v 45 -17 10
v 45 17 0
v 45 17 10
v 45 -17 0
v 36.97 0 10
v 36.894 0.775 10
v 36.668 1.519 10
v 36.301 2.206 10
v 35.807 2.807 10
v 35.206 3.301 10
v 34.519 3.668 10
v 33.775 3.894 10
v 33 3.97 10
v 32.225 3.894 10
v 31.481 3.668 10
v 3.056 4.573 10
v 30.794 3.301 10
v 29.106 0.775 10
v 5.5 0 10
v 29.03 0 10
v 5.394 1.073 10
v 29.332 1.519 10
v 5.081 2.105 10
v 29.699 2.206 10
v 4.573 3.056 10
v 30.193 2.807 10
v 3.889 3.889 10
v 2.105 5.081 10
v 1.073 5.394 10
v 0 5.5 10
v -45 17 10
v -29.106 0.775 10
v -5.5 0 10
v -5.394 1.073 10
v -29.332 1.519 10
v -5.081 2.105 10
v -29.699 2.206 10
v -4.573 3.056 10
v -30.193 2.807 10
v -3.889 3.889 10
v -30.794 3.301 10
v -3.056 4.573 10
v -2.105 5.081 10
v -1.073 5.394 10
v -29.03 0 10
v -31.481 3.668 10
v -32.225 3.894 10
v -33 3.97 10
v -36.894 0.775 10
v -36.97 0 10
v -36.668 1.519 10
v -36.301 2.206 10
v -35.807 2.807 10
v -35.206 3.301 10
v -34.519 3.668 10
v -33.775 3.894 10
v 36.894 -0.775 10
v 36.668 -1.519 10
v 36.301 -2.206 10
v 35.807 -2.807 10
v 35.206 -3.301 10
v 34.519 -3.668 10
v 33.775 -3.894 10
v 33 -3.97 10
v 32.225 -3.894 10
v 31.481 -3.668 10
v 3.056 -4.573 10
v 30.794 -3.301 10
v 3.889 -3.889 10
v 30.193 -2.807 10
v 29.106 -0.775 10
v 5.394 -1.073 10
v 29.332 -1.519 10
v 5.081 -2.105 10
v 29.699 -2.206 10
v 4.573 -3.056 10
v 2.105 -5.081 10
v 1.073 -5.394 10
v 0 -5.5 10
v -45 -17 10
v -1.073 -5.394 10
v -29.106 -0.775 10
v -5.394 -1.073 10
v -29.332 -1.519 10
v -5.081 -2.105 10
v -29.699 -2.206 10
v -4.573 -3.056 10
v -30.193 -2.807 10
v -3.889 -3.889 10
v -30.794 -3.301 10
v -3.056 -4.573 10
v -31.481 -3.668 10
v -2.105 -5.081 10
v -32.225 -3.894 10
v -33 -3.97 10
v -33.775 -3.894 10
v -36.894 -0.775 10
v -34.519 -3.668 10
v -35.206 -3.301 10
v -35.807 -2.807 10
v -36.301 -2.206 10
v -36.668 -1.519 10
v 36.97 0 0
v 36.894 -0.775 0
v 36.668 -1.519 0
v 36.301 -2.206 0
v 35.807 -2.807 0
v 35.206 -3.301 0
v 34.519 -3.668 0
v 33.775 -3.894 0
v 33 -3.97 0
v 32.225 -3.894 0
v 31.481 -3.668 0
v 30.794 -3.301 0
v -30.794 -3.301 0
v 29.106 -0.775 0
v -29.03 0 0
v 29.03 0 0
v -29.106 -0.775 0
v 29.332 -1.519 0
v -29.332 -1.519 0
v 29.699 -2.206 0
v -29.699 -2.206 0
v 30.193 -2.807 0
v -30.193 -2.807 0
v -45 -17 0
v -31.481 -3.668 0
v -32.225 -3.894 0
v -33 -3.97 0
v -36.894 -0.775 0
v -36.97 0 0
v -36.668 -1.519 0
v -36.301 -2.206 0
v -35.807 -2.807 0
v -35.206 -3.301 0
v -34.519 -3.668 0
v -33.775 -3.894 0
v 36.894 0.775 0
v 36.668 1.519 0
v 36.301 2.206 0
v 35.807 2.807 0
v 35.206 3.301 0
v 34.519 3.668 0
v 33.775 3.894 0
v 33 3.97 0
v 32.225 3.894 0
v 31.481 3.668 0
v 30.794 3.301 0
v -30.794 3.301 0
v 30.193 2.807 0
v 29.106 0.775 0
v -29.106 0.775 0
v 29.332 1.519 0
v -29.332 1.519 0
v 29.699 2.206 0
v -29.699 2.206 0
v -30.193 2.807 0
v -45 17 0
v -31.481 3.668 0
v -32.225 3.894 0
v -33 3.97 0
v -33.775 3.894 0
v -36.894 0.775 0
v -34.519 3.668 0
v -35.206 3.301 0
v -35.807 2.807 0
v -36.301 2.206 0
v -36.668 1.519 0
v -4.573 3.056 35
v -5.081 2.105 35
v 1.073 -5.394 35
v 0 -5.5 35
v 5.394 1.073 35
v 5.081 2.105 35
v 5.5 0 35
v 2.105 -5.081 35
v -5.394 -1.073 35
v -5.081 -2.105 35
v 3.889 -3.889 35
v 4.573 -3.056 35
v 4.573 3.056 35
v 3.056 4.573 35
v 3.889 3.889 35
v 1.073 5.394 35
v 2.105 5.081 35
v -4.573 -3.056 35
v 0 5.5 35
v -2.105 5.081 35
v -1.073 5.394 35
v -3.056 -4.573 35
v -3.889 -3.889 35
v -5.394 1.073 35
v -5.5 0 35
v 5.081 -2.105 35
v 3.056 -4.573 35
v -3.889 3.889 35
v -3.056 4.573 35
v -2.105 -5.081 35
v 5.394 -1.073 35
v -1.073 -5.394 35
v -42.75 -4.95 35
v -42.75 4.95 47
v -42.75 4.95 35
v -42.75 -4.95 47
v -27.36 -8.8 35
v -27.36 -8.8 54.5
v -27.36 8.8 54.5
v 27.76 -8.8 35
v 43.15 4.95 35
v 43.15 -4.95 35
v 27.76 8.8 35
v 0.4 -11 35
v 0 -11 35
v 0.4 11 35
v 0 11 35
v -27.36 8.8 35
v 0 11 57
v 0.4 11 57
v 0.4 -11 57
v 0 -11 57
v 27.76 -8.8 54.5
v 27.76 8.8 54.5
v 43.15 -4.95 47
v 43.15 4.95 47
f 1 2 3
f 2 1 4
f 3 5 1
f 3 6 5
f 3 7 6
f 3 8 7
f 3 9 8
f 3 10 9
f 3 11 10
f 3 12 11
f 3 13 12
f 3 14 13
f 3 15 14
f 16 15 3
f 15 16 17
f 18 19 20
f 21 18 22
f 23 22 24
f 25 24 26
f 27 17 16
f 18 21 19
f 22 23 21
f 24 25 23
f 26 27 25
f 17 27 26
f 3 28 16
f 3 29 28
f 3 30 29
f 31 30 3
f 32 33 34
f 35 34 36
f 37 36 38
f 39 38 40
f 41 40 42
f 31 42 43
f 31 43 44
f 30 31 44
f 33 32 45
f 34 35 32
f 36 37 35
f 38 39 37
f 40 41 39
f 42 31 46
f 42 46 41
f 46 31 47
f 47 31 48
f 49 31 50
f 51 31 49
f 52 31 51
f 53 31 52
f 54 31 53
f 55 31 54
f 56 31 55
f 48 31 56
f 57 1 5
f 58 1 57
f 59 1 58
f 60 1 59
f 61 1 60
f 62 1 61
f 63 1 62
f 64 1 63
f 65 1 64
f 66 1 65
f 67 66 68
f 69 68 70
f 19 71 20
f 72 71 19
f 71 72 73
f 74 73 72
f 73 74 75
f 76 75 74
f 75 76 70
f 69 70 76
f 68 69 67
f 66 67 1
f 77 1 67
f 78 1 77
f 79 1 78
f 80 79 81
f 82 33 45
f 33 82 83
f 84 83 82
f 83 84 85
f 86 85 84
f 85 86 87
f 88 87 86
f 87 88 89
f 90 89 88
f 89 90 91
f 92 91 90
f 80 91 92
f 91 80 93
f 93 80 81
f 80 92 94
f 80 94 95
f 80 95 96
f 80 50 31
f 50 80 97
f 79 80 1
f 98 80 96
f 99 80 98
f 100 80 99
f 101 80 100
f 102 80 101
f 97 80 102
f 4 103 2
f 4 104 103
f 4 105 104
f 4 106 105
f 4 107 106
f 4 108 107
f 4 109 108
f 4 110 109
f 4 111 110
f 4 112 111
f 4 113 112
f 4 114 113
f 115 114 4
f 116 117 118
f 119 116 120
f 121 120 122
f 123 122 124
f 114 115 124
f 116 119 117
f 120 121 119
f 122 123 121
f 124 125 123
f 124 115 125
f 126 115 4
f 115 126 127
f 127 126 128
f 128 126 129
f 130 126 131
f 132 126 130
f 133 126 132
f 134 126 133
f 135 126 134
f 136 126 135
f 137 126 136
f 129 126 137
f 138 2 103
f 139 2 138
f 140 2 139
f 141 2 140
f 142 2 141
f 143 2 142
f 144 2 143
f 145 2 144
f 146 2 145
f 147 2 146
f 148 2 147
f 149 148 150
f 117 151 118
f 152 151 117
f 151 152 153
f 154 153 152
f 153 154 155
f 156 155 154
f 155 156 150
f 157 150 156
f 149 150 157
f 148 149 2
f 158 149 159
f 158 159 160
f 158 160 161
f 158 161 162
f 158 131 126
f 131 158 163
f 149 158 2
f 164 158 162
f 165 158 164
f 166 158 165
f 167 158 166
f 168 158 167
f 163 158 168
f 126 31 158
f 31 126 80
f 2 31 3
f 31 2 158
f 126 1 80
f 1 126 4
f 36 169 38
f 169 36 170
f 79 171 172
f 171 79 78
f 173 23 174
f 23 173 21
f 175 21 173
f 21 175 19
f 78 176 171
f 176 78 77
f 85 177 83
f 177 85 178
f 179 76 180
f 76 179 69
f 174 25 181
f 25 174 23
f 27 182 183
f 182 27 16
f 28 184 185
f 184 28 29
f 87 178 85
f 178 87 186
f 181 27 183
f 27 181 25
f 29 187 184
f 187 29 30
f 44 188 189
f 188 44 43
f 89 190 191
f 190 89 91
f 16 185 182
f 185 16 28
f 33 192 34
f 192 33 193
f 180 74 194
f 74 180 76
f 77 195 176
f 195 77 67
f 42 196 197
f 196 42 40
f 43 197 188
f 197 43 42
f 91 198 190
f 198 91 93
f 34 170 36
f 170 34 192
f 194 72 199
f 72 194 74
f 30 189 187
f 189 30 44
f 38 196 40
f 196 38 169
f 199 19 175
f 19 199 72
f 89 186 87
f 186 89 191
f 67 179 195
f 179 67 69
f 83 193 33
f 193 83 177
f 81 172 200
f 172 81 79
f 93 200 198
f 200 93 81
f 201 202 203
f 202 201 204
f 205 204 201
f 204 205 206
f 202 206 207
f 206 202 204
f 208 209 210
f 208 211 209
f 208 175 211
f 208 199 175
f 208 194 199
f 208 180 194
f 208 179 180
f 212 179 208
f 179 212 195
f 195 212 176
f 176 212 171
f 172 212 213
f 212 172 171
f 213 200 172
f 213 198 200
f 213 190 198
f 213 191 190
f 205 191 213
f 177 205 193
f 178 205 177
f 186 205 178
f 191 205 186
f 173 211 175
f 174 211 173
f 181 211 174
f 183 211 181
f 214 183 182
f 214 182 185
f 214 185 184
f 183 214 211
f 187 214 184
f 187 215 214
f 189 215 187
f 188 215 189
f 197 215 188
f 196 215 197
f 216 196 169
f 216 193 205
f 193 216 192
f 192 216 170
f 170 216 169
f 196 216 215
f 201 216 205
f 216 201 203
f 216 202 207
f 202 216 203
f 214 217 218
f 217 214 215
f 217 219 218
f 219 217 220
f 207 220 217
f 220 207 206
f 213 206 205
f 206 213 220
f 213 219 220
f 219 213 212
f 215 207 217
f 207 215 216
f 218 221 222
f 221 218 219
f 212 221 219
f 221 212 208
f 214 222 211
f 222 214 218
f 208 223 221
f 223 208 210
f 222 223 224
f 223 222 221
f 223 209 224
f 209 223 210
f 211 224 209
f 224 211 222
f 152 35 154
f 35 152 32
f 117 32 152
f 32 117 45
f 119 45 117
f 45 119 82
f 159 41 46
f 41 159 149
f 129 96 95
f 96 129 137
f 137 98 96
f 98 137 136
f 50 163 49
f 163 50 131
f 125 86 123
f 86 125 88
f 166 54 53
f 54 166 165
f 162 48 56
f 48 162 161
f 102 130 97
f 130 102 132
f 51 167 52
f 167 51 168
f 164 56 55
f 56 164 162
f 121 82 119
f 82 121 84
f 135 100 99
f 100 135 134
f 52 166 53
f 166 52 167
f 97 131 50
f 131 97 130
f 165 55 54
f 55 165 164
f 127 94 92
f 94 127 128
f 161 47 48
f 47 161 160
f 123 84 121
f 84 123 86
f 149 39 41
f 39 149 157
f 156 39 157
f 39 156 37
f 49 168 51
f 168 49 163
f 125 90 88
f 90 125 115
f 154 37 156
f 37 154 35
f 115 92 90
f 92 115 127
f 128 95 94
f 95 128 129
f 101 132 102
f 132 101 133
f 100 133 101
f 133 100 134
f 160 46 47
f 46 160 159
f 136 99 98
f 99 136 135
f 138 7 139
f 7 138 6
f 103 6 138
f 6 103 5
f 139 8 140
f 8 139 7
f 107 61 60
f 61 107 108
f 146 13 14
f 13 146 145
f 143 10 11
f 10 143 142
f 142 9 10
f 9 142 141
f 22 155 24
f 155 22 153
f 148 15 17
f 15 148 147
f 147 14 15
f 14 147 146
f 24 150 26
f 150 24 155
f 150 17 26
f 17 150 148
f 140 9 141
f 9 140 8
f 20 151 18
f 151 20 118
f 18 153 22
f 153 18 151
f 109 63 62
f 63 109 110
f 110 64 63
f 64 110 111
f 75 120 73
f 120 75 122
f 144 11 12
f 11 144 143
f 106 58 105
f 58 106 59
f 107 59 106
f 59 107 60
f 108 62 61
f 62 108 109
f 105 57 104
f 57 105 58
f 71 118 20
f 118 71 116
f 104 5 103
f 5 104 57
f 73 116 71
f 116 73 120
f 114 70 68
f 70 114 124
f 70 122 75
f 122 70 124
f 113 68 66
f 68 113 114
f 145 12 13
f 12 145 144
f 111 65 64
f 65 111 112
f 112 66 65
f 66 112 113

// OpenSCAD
$fn = 32;

// ----------------------------------------------------------------------
// Boat cleat: 90 mm base, horn 46 mm up
// ----------------------------------------------------------------------

// --- parameters (mm) ---
base_l = 90;              // base length
base_w = 34;              // base width
base_t = 10;              // base thickness
horn_len = 85.5;          // horn length
horn_d = 22;              // horn diameter at the middle
horn_z = 46;              // horn axis height
end_drop = 10;            // how far the horn tips drop
post_d = 11;              // centre post diameter
holes_d = 7.94;           // fixing holes
hole_x = 33;              // fixing hole spacing

difference() {
  union() {
    translate([-45, -17, 0]) cube([base_l, base_w, base_t]);
    /* centre post, sunk 1 mm into the base */
    translate([0, 0, 9]) cylinder(h = 37, d = post_d);
    /* horn: a hull chain of boxes, full in the middle and lighter at the tips */
    hull() {
      translate([-42.75, -4.95, 35]) cube([0.4, 9.9, 12], center = false);
      translate([-27.36, -8.8, 35]) cube([0.4, 17.6, 19.5], center = false);
    }
    hull() {
      translate([-27.36, -8.8, 35]) cube([0.4, 17.6, 19.5], center = false);
      translate([0, -11, 35]) cube([0.4, 22, 22], center = false);
    }
    hull() {
      translate([0, -11, 35]) cube([0.4, 22, 22], center = false);
      translate([27.36, -8.8, 35]) cube([0.4, 17.6, 19.5], center = false);
    }
    hull() {
      translate([27.36, -8.8, 35]) cube([0.4, 17.6, 19.5], center = false);
      translate([42.75, -4.95, 35]) cube([0.4, 9.9, 12], center = false);
    }
  }
  translate([-33, 0, -2.5]) cylinder(h = base_t + 5, d = holes_d);
  translate([33, 0, -2.5]) cylinder(h = base_t + 5, d = holes_d);
}
